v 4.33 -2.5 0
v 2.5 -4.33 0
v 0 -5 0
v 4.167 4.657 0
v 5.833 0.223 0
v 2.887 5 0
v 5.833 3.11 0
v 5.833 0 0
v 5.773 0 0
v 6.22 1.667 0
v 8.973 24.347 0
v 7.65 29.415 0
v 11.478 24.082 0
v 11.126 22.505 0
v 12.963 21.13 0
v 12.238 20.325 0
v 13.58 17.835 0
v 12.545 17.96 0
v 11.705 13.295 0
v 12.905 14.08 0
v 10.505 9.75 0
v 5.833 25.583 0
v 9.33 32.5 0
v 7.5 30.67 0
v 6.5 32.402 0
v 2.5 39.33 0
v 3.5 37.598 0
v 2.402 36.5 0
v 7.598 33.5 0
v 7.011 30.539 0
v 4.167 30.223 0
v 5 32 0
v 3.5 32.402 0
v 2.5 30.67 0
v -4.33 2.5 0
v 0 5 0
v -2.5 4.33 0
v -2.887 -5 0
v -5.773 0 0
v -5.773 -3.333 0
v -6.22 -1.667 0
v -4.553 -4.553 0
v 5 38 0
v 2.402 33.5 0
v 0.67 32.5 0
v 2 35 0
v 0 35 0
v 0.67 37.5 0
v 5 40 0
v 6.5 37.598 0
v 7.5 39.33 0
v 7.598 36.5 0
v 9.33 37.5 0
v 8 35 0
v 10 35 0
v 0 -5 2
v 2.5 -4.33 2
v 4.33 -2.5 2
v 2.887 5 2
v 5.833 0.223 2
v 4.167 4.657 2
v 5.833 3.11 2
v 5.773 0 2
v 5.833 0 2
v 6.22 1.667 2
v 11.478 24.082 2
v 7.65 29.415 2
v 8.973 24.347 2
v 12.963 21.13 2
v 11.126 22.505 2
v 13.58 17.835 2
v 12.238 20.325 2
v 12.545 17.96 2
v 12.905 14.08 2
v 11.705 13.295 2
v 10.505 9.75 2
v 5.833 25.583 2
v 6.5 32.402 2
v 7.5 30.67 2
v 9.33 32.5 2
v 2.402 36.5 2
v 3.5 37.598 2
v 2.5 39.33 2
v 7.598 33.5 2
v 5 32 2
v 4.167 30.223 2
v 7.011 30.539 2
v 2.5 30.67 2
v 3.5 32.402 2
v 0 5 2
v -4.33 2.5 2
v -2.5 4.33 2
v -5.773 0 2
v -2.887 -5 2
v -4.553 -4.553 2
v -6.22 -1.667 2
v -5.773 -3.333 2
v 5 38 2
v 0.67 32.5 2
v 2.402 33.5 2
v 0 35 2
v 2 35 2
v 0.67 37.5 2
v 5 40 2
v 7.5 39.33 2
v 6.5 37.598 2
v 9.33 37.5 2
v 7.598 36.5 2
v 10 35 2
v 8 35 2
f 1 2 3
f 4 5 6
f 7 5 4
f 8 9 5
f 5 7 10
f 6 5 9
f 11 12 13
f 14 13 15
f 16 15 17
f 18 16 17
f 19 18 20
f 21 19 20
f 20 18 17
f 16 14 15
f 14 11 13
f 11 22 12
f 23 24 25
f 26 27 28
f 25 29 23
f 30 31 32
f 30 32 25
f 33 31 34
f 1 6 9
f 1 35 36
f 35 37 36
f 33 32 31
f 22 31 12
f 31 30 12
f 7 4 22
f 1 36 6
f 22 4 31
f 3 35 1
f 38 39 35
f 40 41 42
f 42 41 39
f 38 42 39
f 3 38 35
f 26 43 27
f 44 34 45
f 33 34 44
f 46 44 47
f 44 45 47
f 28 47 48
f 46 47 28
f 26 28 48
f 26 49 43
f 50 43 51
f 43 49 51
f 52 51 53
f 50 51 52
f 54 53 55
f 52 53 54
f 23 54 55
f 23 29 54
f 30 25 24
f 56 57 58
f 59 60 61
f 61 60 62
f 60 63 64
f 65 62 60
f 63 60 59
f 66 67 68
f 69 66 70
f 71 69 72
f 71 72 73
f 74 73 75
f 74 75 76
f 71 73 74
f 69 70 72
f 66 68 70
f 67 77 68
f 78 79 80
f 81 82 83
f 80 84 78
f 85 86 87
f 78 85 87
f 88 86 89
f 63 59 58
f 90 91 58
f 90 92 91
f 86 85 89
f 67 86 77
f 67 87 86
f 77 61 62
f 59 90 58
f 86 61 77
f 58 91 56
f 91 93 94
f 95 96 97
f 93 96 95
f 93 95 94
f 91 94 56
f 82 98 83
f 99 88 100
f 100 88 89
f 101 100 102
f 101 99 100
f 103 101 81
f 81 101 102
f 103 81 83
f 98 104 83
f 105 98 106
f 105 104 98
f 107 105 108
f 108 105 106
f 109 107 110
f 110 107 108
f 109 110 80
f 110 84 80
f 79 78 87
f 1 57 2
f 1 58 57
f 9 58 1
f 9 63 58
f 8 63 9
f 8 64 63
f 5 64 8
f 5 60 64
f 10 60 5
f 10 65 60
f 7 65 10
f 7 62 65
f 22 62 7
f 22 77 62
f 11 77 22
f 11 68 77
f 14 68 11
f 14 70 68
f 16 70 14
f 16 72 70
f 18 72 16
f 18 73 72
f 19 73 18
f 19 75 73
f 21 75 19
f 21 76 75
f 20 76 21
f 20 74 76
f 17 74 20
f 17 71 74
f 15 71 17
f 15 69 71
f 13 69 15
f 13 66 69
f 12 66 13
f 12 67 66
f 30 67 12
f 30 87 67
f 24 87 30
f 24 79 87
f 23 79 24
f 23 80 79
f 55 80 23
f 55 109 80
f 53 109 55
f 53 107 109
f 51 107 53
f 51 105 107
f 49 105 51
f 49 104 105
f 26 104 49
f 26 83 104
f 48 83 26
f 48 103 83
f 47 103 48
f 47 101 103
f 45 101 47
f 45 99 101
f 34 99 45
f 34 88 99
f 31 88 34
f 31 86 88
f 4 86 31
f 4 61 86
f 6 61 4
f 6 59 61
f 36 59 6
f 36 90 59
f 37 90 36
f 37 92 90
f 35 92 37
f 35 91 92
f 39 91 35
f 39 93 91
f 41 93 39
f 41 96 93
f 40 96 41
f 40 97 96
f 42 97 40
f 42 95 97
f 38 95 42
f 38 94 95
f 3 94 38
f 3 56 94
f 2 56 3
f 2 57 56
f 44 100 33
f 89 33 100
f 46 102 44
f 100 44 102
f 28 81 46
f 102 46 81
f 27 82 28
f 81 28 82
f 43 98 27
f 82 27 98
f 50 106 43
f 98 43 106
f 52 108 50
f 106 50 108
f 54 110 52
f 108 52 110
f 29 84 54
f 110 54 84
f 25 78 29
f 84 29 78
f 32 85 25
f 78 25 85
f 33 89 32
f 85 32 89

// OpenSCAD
// [FL_INDEX: keywords="openscad, 3d_parametric, Note-Jewlery, csg_solid" | COT="Parametric OpenSCAD design from 3DCodeverse"]
// Title: Note-Jewlery

theitem = "1/8"; // [alt,bass,violin,#,b,natural,1/1,1/2,1/4,1/8,1/16,1/32,1/1 break,1/2 break,1/4 break,1/8 break,1/16 break,1/32 break]

//height of the note-body. a normal note has a height of "3.5 * note_body_height"
note_body_height =10;
zeilenhoehe = note_body_height;

ring_x = 5;
ring_y = 35;
ring_inner_radius = 3;
ring_wallthickness = 2;

z_height = 2; 

$fn=11+1;



 
linear_extrude(height=z_height)
difference(){
	union(){
		item(theitem);
		translate([ring_x,ring_y,0])
			circle(r=ring_inner_radius+ring_wallthickness);
	}
	translate([ring_x,ring_y,0])
		circle(r=ring_inner_radius);
	
}



module item(item){

if(item == "violin"){
	violinschluessel(zeilenhoehe);
}else if(item == "bass"){
	bassschluessel(zeilenhoehe);
}else if(item == "alt"){
	altschluessel(zeilenhoehe);
}else if(item == "#"){
	translate([0,-zeilenhoehe + 5*(zeilenhoehe/2),0])
			vorzeichen("#", zeilenhoehe);
}else if(item == "b"){
	translate([0,-zeilenhoehe + 5*(zeilenhoehe/2),0])
			vorzeichen("b", zeilenhoehe);
}else if(item == "natural"){
	translate([0,-zeilenhoehe + 5*(zeilenhoehe/2),0])
			vorzeichen("n", zeilenhoehe);
}else if(item == "1/1"){	
	note(zeilenhoehe,"1/1",5);
}else if(item == "1/2"){	
	note(zeilenhoehe,"1/2",5);
}else if(item == "1/4"){	
	note(zeilenhoehe,"1/4",5);
}else if(item == "1/8"){	
	note(zeilenhoehe,"1/8",5);
}else if(item == "1/16"){	
	note(zeilenhoehe,"1/6",5);
}else if(item == "1/32"){	
	note(zeilenhoehe,"1/3",5);
}else if(item == "1/32"){	
	note(zeilenhoehe,"1/3",5);
}else if(item == "1/1 break"){	
	break(zeilenhoehe,"1/1");
}else if(item == "1/2 break"){	
	break(zeilenhoehe,"1/2");
}else if(item == "1/4 break"){	
	break(zeilenhoehe,"1/4");
}else if(item == "1/8 break"){	
	break(zeilenhoehe,"1/8");
}else if(item == "1/16 break"){	
	break(zeilenhoehe,"1/6");
}else if(item == "1/32 break"){	
	break(zeilenhoehe,"1/3");
}

}


/////////////////////////////////////





module note(zh,nw,tonhoehe){

	notenradius = zh/2;
	zweidrittel=notenradius*2/3;

	if(nw != "1/1"){

	difference(){
	union(){
			translate([zh/2-zweidrittel/4,0,0])
				square(size = [zweidrittel/2,zh*3.5]);
		rotate([0,0,30])
			hull(){
				circle(r = zh/2);
				translate([zweidrittel,0,0])
					circle(r = zweidrittel);
				translate([-zweidrittel,0,0])
					circle(r = zweidrittel);
			}
	}
		if(nw == "1/2"){
			rotate([0,0,30])
				hull(){
					translate([zh/4,0,0])
						circle(r = zh/4);

					translate([-zh/4,0,0])
						circle(r = zh/4);
				}
		}
	}

	
	if(nw == "1/8"){
		translate([tonhoehe >= 6 ? zh/2.5 : zh/2 + (zweidrittel/4.1),zh*2.85,0])
			if(tonhoehe >= 6)
				mirror(0,1,0)
					fahne(zh);
			else
				fahne(zh);
	}
	if(nw == "1/6"){
		for(i=[0:1])
		translate([tonhoehe >= 6 ? zh/2.5 : zh/2 + (zweidrittel/4.1),zh*2.85 - (i*zh),0])
			if(tonhoehe >= 6)
				mirror(0,1,0)
					fahne(zh);
			else
				fahne(zh);
	}
	if(nw == "1/3"){
		for(i=[-1:1])
		translate([tonhoehe >= 6 ? zh/2.5 : zh/2 + (zweidrittel/4.1),zh*2.85 - (i*zh),0])
			if(tonhoehe >= 6)
				mirror(0,1,0)
					fahne(zh);
			else
				fahne(zh);
		translate([zh/2-zweidrittel/4,zh,0])
				square(size = [zweidrittel/2,zh*3.5]);
	}


	}else{
difference(){
	union(){
			hull(){
				circle(r = zh/2);
				translate([zweidrittel,0,0])
					circle(r = zweidrittel);
				translate([-zweidrittel,0,0])
					circle(r = zweidrittel);
			}
	}

			rotate([0,0,-30])
				hull(){
					translate([zh/8,0,0])
						circle(r = zh/4);

					translate([-zh/8,0,0])
						circle(r = zh/4);
				}
}

	}
}



module fahne(zh){
scale(v = [zh/4, zh/4, zh/4])
translate([1.5,-2.5,0])
  polygon(points=
    [[-1.608, 1.379], [-0.236, 0.839], [0.625, 0.102], [1.070, -0.770], [1.193, -1.716], [0.857, -3.582], [0.377, -5.000], [1.337, -3.268], [1.607, -1.766], [1.360, -0.448], [0.766, 0.733], [-0.765, 2.866], [-1.359, 3.910], [-1.608, 5.000]]
    , paths=
    [[0, 1, 2, 3, 4, 5, 6, 7, 8, 9, 10, 11, 12, 13, 0]]
    );

}


module vorzeichen(vz, zh){
	if(vz == "#")
		vorzeichen_sharp(zh);
	if(vz == "b")
		vorzeichen_b(zh);
	if(vz == "n")
		vorzeichen_natural(zh);
}


module vorzeichen_sharp(zh) {
scale(v = [zh/5, zh/5, zh/5])
  polygon(points=
    [[0.676, 6.500], [0.676, 3.768], [-0.620, 3.194], [-0.620, 5.880], [-1.259, 5.880], [-1.259, 2.907], [-1.935, 2.611], [-1.935, 0.444], [-1.259, 0.741], [-1.259, -1.852], [-1.935, -2.148], [-1.935, -4.315], [-1.259, -4.018], [-1.259, -6.500], [-0.620, -6.500], [-0.620, -3.731], [0.676, -3.167], [0.676, -5.843], [1.315, -5.843], [1.315, -2.880], [1.935, -2.611], [1.935, -0.435], [1.315, -0.713], [1.315, 1.880], [1.935, 2.157], [1.935, 4.324], [1.315, 4.046], [1.315, 6.500], [0.676, 1.602], [0.676, -0.991], [-0.620, -1.565], [-0.620, 1.028]]
    , paths=
    [[0, 1, 2, 3, 4, 5, 6, 7, 8, 9, 10, 11, 12, 13, 14, 15, 16, 17, 18, 19, 20, 21, 22, 23, 24, 25, 26, 27, 0, 0], [28, 29, 30, 31, 28, 28]]
    );
}

module vorzeichen_b(zh) {
scale(v = [zh/5, zh/5, zh/5])
translate([0,3,0])
  polygon(points=
    [[-3.276, 7.500], [-3.276, -7.500], [-3.093, -7.500], [-0.500, -6.648], [1.446, -5.288], [2.710, -3.675], [3.256, -2.064], [3.049, -0.712], [2.054, 0.127], [0.236, 0.197], [-2.440, -0.758], [-2.440, 7.500], [-3.276, 7.500], [-0.009, -0.627], [0.711, -0.811], [1.005, -1.301], [0.585, -2.862], [-0.741, -4.638], [-2.440, -5.958], [-2.440, -1.280]]
    , paths=
    [[0, 1, 2, 3, 4, 5, 6, 7, 8, 9, 10, 11, 12, 0], [13, 14, 15, 16, 17, 18, 19, 13, 13]]
    );
}

module vorzeichen_natural(zh) {
scale(v = [zh/5, zh/5, zh/5])
  polygon(points=
    [[-1.915, 6.500], [-1.915, -3.955], [1.295, -1.911], [1.295, -6.500], [1.915, -6.500], [1.915, 3.955], [-1.268, 1.929], [-1.268, 6.500], [1.295, 1.837], [1.295, -0.190], [-1.268, -1.818], [-1.268, 0.208]]
    , paths=
    [[0, 1, 2, 3, 4, 5, 6, 7, 0], [8, 9, 10, 11, 8]]
    );
}


module break(zh,nw){
	if(nw == "1/1")
		pause_1_1(zh);
	if(nw == "1/2")
		pause_1_2(zh);
	if(nw == "1/4")
		pause_1_4(zh);
	if(nw == "1/8")
		pause_1_8(zh);
	if(nw == "1/6")
		pause_1_16(zh);
	if(nw == "1/3")
		pause_1_32(zh);
}


module pause_1_1(zh) {
translate([0,2.5*zh,0])
	square(size = [zh*2,zh*0.5]);
}

module pause_1_2(zh) {
translate([0,2*zh,0])
	square(size = [zh*2,zh*0.5]);
}

module pause_1_4(zh) {
translate([0,2*zh,0])
scale(v = [zh/5.5, zh/5.5, zh/5.5])
  polygon(points=
    [[-0.983, 7.462], [-1.147, 7.044], [-0.707, 6.498], [-0.039, 5.578], [0.121, 4.196], [-0.584, 2.939], [-1.172, 2.439], [-2.362, 1.138], [-2.407, 0.846], [-1.545, -0.471], [0.527, -2.922], [0.589, -2.983], [0.507, -2.942], [-1.205, -2.433], [-2.382, -2.442], [-2.677, -2.733], [-2.550, -4.386], [-1.402, -6.689], [-0.815, -7.465], [-0.605, -7.465], [-0.666, -7.174], [-1.124, -5.887], [-1.065, -4.554], [-0.605, -3.968], [0.668, -3.969], [1.907, -4.595], [2.075, -4.744], [2.494, -4.575], [2.346, -4.095], [0.778, -2.231], [0.191, -0.849], [0.372, 0.150], [0.946, 0.994], [1.530, 1.494], [2.744, 2.837], [2.600, 3.588], [0.946, 5.578], [-0.707, 7.483], [-0.983, 7.462]]
    , paths=
    [[0, 1, 2, 3, 4, 5, 6, 7, 8, 9, 10, 11, 12, 13, 14, 15, 16, 17, 18, 19, 20, 21, 22, 23, 24, 25, 26, 27, 28, 29, 30, 31, 32, 33, 34, 35, 36, 37, 38, 0]]
    );
}

module pause_1_8(zh) {
translate([0,2*zh,0])
scale(v = [zh/5.5, zh/5.5, zh/5.5])
  polygon(points=
    [[-1.481, 4.970], [-2.212, 4.617], [-2.667, 3.941], [-2.709, 3.489], [-2.537, 2.735], [-2.058, 2.169], [-1.355, 1.832], [-0.302, 1.807], [1.121, 2.152], [1.378, 2.241], [0.108, -1.269], [-1.140, -4.775], [-1.030, -4.843], [-0.536, -4.991], [0.088, -4.712], [1.421, -0.193], [2.711, 4.262], [2.669, 4.324], [2.218, 4.392], [2.066, 4.198], [1.121, 3.080], [0.539, 2.949], [0.150, 3.747], [-0.452, 4.802], [-1.481, 4.970]]
    , paths=
    [[0, 1, 2, 3, 4, 5, 6, 7, 8, 9, 10, 11, 12, 13, 14, 15, 16, 17, 18, 19, 20, 21, 22, 23, 24, 0]]
    );
}

module pause_1_16(zh) {
translate([0,1.5*zh,0])
scale(v = [zh/5.5, zh/5.5, zh/5.5])
  polygon(points=
    [[-0.573, 7.468], [-1.285, 7.123], [-1.724, 6.464], [-1.769, 6.024], [-1.601, 5.288], [-1.134, 4.737], [-0.445, 4.408], [0.557, 4.374], [1.924, 4.700], [2.194, 4.786], [1.212, 1.595], [0.434, 0.506], [-0.235, 0.254], [-0.614, 1.032], [-0.971, 1.846], [-1.808, 2.254], [-2.753, 2.014], [-3.361, 1.216], [-3.406, 0.777], [-3.238, 0.044], [-2.771, -0.507], [-2.082, -0.836], [-0.865, -0.836], [0.266, -0.543], [0.583, -0.461], [-1.515, -7.255], [-1.182, -7.444], [-0.676, -7.444], [-0.343, -7.235], [1.545, -0.206], [3.413, 6.777], [3.371, 6.838], [2.972, 6.924], [2.639, 6.505], [1.965, 5.646], [1.401, 5.498], [1.023, 6.275], [0.434, 7.303], [-0.573, 7.468]]
    , paths=
    [[0, 1, 2, 3, 4, 5, 6, 7, 8, 9, 10, 11, 12, 13, 14, 15, 16, 17, 18, 19, 20, 21, 22, 23, 24, 25, 26, 27, 28, 29, 30, 31, 32, 33, 34, 35, 36, 37, 38, 0]]
    );
}

module pause_1_32(zh) {
translate([0,2*zh,0])
scale(v = [zh/5.5, zh/5.5, zh/5.5])
  polygon(points=
    [[0.122, 9.959], [-0.580, 9.615], [-1.016, 8.963], [-1.061, 8.528], [-1.016, 8.093], [-0.689, 7.491], [-0.126, 7.078], [0.764, 6.891], [2.488, 7.200], [2.817, 7.306], [2.402, 5.708], [1.926, 3.969], [1.179, 2.973], [0.642, 2.826], [0.269, 3.594], [-0.085, 4.404], [-0.912, 4.803], [-1.846, 4.566], [-2.447, 3.782], [-2.492, 3.347], [-2.324, 2.619], [-1.863, 2.074], [-1.183, 1.749], [0.020, 1.749], [1.138, 2.038], [1.471, 2.144], [0.597, -1.092], [-0.147, -2.129], [-0.789, -2.357], [-1.162, -1.588], [-1.516, -0.783], [-2.343, -0.380], [-3.276, -0.617], [-3.878, -1.405], [-3.923, -1.839], [-3.878, -2.274], [-3.550, -2.876], [-2.987, -3.291], [-2.077, -3.478], [-1.370, -3.433], [-0.166, -3.124], [0.102, -3.018], [0.102, -3.084], [-1.682, -9.758], [-1.102, -10.005], [-0.520, -9.758], [1.740, -0.222], [3.919, 9.317], [3.625, 9.439], [3.272, 9.110], [2.467, 8.029], [2.073, 8.008], [1.699, 8.777], [1.118, 9.793], [0.122, 9.959]]
    , paths=
    [[0, 1, 2, 3, 4, 5, 6, 7, 8, 9, 10, 11, 12, 13, 14, 15, 16, 17, 18, 19, 20, 21, 22, 23, 24, 25, 26, 27, 28, 29, 30, 31, 32, 33, 34, 35, 36, 37, 38, 39, 40, 41, 42, 43, 44, 45, 46, 47, 48, 49, 50, 51, 52, 53, 54, 0]]
    );
}


module altschluessel(zh) {
scale(v = [zh/6.2, zh/6.2, zh/6.2])
translate([0,12.5,0])
  polygon(points=
    [[-8.123, -12.484], [-8.123, 11.892], [-8.123, 12.431], [-5.302, 12.431], [-5.302, -11.945], [-5.302, -12.484], [-3.880, -12.484], [-3.880, 11.892], [-3.880, 12.431], [-2.979, 12.431], [-2.979, 0.222], [-1.632, 1.681], [-0.497, 4.038], [-0.019, 5.888], [0.638, 3.753], [1.657, 2.611], [2.792, 2.273], [3.946, 2.591], [4.584, 3.552], [4.966, 6.692], [4.924, 8.203], [4.711, 9.556], [4.171, 10.782], [3.142, 11.522], [2.007, 11.681], [1.158, 11.501], [0.776, 10.994], [1.179, 10.317], [1.635, 9.736], [1.763, 9.186], [1.317, 8.097], [0.129, 7.643], [-1.059, 8.171], [-1.536, 9.429], [-1.331, 10.332], [-0.847, 11.100], [0.723, 12.135], [2.611, 12.484], [4.680, 12.104], [6.451, 10.983], [7.681, 9.165], [8.127, 6.744], [7.953, 5.033], [7.438, 3.647], [6.642, 2.572], [5.656, 1.829], [3.333, 1.216], [1.211, 1.787], [0.087, -0.031], [1.211, -1.839], [3.492, -1.363], [4.815, -1.567], [5.963, -2.167], [6.893, -3.089], [7.575, -4.249], [8.127, -6.892], [7.960, -8.333], [7.459, -9.672], [6.655, -10.824], [5.581, -11.723], [4.274, -12.293], [2.792, -12.484], [1.113, -12.229], [-0.263, -11.617], [-1.179, -10.644], [-1.483, -9.291], [-0.942, -8.129], [0.087, -7.653], [1.285, -8.129], [1.816, -9.291], [1.688, -9.799], [1.317, -10.338], [0.967, -10.782], [0.829, -11.152], [1.190, -11.628], [2.102, -11.860], [3.559, -11.450], [4.436, -10.391], [4.865, -8.816], [5.008, -6.892], [4.595, -3.699], [3.940, -2.668], [2.792, -2.325], [1.694, -2.590], [0.882, -3.393], [0.023, -5.898], [-0.635, -3.551], [-1.706, -1.554], [-2.979, -0.222], [-2.979, -12.484], [-3.880, -12.484]]
    , paths=
    [[0, 1, 2, 3, 4, 5, 0, 0], [6, 7, 8, 9, 10, 11, 12, 13, 14, 15, 16, 17, 18, 19, 20, 21, 22, 23, 24, 25, 26, 27, 28, 29, 30, 31, 32, 33, 34, 35, 36, 37, 38, 39, 40, 41, 42, 43, 44, 45, 46, 47, 48, 49, 50, 51, 52, 53, 54, 55, 56, 57, 58, 59, 60, 61, 62, 63, 64, 65, 66, 67, 68, 69, 70, 71, 72, 73, 74, 75, 76, 77, 78, 79, 80, 81, 82, 83, 84, 85, 86, 87, 88, 89, 90, 6]]
    );}





module bassschluessel(zh) {
translate([0,zh*1.3,0])
scale(v = [zh/6.2, zh/6.2, zh/6.2])
translate([0,7.5,0])
  polygon(points=
    [[-6.497, -7.077], [-3.725, -5.161], [-1.850, -3.543], [-0.220, -1.360], [0.670, 0.713], [1.064, 2.959], [0.796, 4.860], [-0.102, 6.360], [-0.835, 6.802], [-1.763, 6.949], [-3.630, 6.556], [-4.367, 6.036], [-4.843, 5.268], [-4.922, 5.040], [-4.725, 4.750], [-4.410, 4.648], [-4.024, 4.718], [-3.496, 4.797], [-2.370, 4.357], [-1.874, 3.297], [-2.126, 2.457], [-2.811, 1.836], [-3.772, 1.609], [-4.646, 1.751], [-5.379, 2.182], [-5.868, 2.850], [-6.032, 3.690], [-5.850, 4.798], [-5.308, 5.747], [-3.449, 7.051], [-1.173, 7.491], [0.060, 7.331], [1.222, 6.847], [2.234, 6.090], [3.010, 5.103], [3.510, 3.959], [3.679, 2.732], [3.301, 0.551], [2.167, -1.470], [0.476, -3.285], [-1.574, -4.847], [-6.387, -7.486], [4.443, 5.072], [4.750, 5.779], [5.483, 6.069], [6.184, 5.747], [6.499, 5.033], [6.184, 4.310], [5.443, 4.027], [4.727, 4.334], [4.443, 0.957], [4.735, 1.671], [5.483, 1.962], [6.184, 1.648], [6.499, 0.957], [6.200, 0.211], [5.483, -0.088], [4.735, 0.203]]
    , paths=
    [[0, 1, 2, 3, 4, 5, 6, 7, 8, 9, 10, 11, 12, 13, 14, 15, 16, 17, 18, 19, 20, 21, 22, 23, 24, 25, 26, 27, 28, 29, 30, 31, 32, 33, 34, 35, 36, 37, 38, 39, 40, 41, 0, 0], [42, 43, 44, 45, 46, 47, 48, 49, 42, 42], [50, 51, 52, 53, 54, 55, 56, 57, 50, 50]]
    );}



module violinschluessel(zh) {
scale(v = [zh/5.2, zh/5.2, zh/5.2])
translate([0,9.5,0])
  polygon(points=
    [[0.832, -1.806], [-0.578, -2.778], [-1.061, -3.577], [-1.220, -4.447], [-0.848, -5.711], [0.249, -6.726], [0.485, -6.967], [0.283, -7.088], [-0.767, -6.625], [-1.608, -5.840], [-2.165, -4.819], [-2.368, -3.656], [-2.153, -2.373], [-1.583, -1.187], [-0.715, -0.206], [0.367, 0.439], [-0.215, 3.492], [-1.983, 1.806], [-3.390, 0.043], [-4.321, -1.828], [-4.664, -3.854], [-4.284, -5.677], [-3.221, -7.294], [-1.577, -8.405], [0.485, -8.825], [2.140, -8.541], [1.439, -1.720], [2.756, -8.335], [3.610, -7.818], [4.219, -7.066], [4.706, -4.869], [4.175, -3.269], [3.052, -2.133], [-0.291, 7.225], [0.654, 8.120], [1.659, 9.574], [2.444, 11.277], [2.731, 12.885], [2.672, 13.505], [2.385, 14.218], [1.769, 14.459], [1.047, 14.221], [0.401, 13.505], [-0.359, 11.561], [-0.680, 9.324], [-0.823, 6.726], [-1.456, 10.984], [-1.178, 13.591], [-0.443, 15.698], [0.637, 17.066], [1.406, 17.487], [1.693, 17.367], [2.022, 16.988], [3.154, 14.583], [3.533, 11.733], [3.153, 8.868], [2.064, 6.202], [0.333, 4.000], [1.017, 0.611], [1.786, 0.688], [3.533, 0.275], [4.892, -0.843], [5.753, -2.443], [6.057, -4.327], [5.861, -5.784], [5.272, -7.105], [4.290, -8.190], [2.908, -8.946], [3.271, -10.761], [3.651, -12.644], [3.769, -13.995], [3.288, -15.810], [1.963, -17.048], [0.148, -17.487], [-1.157, -17.288], [-2.284, -16.696], [-3.079, -15.758], [-3.381, -14.537], [-3.094, -13.393], [-2.402, -12.515], [-1.372, -12.137], [-0.435, -12.412], [0.266, -13.169], [0.528, -14.218], [0.021, -15.509], [-1.262, -16.042], [-1.456, -16.042], [-0.804, -16.627], [0.165, -16.825], [1.321, -16.584], [2.326, -15.930], [2.866, -15.053], [3.077, -13.599], [2.959, -12.361], [2.604, -10.743], [2.258, -9.212], [0.680, -9.410], [-0.663, -9.267], [-1.929, -8.834], [-4.090, -7.225], [-5.534, -4.886], [-6.057, -2.159], [-5.559, 0.353], [-4.386, 2.615], [-2.891, 4.542]]
    , paths=
    [[0, 1, 2, 3, 4, 5, 6, 7, 8, 9, 10, 11, 12, 13, 14, 15, 16, 17, 18, 19, 20, 21, 22, 23, 24, 25, 0, 0], [26, 27, 28, 29, 30, 31, 32, 26, 26], [33, 34, 35, 36, 37, 38, 39, 40, 41, 42, 43, 44, 33, 33], [45, 46, 47, 48, 49, 50, 51, 52, 53, 54, 55, 56, 57, 58, 59, 60, 61, 62, 63, 64, 65, 66, 67, 68, 69, 70, 71, 72, 73, 74, 75, 76, 77, 78, 79, 80, 81, 82, 83, 84, 85, 86, 87, 88, 89, 90, 91, 92, 93, 94, 95, 96, 97, 98, 99, 100, 101, 102, 103, 104, 45, 45]]
    );}
